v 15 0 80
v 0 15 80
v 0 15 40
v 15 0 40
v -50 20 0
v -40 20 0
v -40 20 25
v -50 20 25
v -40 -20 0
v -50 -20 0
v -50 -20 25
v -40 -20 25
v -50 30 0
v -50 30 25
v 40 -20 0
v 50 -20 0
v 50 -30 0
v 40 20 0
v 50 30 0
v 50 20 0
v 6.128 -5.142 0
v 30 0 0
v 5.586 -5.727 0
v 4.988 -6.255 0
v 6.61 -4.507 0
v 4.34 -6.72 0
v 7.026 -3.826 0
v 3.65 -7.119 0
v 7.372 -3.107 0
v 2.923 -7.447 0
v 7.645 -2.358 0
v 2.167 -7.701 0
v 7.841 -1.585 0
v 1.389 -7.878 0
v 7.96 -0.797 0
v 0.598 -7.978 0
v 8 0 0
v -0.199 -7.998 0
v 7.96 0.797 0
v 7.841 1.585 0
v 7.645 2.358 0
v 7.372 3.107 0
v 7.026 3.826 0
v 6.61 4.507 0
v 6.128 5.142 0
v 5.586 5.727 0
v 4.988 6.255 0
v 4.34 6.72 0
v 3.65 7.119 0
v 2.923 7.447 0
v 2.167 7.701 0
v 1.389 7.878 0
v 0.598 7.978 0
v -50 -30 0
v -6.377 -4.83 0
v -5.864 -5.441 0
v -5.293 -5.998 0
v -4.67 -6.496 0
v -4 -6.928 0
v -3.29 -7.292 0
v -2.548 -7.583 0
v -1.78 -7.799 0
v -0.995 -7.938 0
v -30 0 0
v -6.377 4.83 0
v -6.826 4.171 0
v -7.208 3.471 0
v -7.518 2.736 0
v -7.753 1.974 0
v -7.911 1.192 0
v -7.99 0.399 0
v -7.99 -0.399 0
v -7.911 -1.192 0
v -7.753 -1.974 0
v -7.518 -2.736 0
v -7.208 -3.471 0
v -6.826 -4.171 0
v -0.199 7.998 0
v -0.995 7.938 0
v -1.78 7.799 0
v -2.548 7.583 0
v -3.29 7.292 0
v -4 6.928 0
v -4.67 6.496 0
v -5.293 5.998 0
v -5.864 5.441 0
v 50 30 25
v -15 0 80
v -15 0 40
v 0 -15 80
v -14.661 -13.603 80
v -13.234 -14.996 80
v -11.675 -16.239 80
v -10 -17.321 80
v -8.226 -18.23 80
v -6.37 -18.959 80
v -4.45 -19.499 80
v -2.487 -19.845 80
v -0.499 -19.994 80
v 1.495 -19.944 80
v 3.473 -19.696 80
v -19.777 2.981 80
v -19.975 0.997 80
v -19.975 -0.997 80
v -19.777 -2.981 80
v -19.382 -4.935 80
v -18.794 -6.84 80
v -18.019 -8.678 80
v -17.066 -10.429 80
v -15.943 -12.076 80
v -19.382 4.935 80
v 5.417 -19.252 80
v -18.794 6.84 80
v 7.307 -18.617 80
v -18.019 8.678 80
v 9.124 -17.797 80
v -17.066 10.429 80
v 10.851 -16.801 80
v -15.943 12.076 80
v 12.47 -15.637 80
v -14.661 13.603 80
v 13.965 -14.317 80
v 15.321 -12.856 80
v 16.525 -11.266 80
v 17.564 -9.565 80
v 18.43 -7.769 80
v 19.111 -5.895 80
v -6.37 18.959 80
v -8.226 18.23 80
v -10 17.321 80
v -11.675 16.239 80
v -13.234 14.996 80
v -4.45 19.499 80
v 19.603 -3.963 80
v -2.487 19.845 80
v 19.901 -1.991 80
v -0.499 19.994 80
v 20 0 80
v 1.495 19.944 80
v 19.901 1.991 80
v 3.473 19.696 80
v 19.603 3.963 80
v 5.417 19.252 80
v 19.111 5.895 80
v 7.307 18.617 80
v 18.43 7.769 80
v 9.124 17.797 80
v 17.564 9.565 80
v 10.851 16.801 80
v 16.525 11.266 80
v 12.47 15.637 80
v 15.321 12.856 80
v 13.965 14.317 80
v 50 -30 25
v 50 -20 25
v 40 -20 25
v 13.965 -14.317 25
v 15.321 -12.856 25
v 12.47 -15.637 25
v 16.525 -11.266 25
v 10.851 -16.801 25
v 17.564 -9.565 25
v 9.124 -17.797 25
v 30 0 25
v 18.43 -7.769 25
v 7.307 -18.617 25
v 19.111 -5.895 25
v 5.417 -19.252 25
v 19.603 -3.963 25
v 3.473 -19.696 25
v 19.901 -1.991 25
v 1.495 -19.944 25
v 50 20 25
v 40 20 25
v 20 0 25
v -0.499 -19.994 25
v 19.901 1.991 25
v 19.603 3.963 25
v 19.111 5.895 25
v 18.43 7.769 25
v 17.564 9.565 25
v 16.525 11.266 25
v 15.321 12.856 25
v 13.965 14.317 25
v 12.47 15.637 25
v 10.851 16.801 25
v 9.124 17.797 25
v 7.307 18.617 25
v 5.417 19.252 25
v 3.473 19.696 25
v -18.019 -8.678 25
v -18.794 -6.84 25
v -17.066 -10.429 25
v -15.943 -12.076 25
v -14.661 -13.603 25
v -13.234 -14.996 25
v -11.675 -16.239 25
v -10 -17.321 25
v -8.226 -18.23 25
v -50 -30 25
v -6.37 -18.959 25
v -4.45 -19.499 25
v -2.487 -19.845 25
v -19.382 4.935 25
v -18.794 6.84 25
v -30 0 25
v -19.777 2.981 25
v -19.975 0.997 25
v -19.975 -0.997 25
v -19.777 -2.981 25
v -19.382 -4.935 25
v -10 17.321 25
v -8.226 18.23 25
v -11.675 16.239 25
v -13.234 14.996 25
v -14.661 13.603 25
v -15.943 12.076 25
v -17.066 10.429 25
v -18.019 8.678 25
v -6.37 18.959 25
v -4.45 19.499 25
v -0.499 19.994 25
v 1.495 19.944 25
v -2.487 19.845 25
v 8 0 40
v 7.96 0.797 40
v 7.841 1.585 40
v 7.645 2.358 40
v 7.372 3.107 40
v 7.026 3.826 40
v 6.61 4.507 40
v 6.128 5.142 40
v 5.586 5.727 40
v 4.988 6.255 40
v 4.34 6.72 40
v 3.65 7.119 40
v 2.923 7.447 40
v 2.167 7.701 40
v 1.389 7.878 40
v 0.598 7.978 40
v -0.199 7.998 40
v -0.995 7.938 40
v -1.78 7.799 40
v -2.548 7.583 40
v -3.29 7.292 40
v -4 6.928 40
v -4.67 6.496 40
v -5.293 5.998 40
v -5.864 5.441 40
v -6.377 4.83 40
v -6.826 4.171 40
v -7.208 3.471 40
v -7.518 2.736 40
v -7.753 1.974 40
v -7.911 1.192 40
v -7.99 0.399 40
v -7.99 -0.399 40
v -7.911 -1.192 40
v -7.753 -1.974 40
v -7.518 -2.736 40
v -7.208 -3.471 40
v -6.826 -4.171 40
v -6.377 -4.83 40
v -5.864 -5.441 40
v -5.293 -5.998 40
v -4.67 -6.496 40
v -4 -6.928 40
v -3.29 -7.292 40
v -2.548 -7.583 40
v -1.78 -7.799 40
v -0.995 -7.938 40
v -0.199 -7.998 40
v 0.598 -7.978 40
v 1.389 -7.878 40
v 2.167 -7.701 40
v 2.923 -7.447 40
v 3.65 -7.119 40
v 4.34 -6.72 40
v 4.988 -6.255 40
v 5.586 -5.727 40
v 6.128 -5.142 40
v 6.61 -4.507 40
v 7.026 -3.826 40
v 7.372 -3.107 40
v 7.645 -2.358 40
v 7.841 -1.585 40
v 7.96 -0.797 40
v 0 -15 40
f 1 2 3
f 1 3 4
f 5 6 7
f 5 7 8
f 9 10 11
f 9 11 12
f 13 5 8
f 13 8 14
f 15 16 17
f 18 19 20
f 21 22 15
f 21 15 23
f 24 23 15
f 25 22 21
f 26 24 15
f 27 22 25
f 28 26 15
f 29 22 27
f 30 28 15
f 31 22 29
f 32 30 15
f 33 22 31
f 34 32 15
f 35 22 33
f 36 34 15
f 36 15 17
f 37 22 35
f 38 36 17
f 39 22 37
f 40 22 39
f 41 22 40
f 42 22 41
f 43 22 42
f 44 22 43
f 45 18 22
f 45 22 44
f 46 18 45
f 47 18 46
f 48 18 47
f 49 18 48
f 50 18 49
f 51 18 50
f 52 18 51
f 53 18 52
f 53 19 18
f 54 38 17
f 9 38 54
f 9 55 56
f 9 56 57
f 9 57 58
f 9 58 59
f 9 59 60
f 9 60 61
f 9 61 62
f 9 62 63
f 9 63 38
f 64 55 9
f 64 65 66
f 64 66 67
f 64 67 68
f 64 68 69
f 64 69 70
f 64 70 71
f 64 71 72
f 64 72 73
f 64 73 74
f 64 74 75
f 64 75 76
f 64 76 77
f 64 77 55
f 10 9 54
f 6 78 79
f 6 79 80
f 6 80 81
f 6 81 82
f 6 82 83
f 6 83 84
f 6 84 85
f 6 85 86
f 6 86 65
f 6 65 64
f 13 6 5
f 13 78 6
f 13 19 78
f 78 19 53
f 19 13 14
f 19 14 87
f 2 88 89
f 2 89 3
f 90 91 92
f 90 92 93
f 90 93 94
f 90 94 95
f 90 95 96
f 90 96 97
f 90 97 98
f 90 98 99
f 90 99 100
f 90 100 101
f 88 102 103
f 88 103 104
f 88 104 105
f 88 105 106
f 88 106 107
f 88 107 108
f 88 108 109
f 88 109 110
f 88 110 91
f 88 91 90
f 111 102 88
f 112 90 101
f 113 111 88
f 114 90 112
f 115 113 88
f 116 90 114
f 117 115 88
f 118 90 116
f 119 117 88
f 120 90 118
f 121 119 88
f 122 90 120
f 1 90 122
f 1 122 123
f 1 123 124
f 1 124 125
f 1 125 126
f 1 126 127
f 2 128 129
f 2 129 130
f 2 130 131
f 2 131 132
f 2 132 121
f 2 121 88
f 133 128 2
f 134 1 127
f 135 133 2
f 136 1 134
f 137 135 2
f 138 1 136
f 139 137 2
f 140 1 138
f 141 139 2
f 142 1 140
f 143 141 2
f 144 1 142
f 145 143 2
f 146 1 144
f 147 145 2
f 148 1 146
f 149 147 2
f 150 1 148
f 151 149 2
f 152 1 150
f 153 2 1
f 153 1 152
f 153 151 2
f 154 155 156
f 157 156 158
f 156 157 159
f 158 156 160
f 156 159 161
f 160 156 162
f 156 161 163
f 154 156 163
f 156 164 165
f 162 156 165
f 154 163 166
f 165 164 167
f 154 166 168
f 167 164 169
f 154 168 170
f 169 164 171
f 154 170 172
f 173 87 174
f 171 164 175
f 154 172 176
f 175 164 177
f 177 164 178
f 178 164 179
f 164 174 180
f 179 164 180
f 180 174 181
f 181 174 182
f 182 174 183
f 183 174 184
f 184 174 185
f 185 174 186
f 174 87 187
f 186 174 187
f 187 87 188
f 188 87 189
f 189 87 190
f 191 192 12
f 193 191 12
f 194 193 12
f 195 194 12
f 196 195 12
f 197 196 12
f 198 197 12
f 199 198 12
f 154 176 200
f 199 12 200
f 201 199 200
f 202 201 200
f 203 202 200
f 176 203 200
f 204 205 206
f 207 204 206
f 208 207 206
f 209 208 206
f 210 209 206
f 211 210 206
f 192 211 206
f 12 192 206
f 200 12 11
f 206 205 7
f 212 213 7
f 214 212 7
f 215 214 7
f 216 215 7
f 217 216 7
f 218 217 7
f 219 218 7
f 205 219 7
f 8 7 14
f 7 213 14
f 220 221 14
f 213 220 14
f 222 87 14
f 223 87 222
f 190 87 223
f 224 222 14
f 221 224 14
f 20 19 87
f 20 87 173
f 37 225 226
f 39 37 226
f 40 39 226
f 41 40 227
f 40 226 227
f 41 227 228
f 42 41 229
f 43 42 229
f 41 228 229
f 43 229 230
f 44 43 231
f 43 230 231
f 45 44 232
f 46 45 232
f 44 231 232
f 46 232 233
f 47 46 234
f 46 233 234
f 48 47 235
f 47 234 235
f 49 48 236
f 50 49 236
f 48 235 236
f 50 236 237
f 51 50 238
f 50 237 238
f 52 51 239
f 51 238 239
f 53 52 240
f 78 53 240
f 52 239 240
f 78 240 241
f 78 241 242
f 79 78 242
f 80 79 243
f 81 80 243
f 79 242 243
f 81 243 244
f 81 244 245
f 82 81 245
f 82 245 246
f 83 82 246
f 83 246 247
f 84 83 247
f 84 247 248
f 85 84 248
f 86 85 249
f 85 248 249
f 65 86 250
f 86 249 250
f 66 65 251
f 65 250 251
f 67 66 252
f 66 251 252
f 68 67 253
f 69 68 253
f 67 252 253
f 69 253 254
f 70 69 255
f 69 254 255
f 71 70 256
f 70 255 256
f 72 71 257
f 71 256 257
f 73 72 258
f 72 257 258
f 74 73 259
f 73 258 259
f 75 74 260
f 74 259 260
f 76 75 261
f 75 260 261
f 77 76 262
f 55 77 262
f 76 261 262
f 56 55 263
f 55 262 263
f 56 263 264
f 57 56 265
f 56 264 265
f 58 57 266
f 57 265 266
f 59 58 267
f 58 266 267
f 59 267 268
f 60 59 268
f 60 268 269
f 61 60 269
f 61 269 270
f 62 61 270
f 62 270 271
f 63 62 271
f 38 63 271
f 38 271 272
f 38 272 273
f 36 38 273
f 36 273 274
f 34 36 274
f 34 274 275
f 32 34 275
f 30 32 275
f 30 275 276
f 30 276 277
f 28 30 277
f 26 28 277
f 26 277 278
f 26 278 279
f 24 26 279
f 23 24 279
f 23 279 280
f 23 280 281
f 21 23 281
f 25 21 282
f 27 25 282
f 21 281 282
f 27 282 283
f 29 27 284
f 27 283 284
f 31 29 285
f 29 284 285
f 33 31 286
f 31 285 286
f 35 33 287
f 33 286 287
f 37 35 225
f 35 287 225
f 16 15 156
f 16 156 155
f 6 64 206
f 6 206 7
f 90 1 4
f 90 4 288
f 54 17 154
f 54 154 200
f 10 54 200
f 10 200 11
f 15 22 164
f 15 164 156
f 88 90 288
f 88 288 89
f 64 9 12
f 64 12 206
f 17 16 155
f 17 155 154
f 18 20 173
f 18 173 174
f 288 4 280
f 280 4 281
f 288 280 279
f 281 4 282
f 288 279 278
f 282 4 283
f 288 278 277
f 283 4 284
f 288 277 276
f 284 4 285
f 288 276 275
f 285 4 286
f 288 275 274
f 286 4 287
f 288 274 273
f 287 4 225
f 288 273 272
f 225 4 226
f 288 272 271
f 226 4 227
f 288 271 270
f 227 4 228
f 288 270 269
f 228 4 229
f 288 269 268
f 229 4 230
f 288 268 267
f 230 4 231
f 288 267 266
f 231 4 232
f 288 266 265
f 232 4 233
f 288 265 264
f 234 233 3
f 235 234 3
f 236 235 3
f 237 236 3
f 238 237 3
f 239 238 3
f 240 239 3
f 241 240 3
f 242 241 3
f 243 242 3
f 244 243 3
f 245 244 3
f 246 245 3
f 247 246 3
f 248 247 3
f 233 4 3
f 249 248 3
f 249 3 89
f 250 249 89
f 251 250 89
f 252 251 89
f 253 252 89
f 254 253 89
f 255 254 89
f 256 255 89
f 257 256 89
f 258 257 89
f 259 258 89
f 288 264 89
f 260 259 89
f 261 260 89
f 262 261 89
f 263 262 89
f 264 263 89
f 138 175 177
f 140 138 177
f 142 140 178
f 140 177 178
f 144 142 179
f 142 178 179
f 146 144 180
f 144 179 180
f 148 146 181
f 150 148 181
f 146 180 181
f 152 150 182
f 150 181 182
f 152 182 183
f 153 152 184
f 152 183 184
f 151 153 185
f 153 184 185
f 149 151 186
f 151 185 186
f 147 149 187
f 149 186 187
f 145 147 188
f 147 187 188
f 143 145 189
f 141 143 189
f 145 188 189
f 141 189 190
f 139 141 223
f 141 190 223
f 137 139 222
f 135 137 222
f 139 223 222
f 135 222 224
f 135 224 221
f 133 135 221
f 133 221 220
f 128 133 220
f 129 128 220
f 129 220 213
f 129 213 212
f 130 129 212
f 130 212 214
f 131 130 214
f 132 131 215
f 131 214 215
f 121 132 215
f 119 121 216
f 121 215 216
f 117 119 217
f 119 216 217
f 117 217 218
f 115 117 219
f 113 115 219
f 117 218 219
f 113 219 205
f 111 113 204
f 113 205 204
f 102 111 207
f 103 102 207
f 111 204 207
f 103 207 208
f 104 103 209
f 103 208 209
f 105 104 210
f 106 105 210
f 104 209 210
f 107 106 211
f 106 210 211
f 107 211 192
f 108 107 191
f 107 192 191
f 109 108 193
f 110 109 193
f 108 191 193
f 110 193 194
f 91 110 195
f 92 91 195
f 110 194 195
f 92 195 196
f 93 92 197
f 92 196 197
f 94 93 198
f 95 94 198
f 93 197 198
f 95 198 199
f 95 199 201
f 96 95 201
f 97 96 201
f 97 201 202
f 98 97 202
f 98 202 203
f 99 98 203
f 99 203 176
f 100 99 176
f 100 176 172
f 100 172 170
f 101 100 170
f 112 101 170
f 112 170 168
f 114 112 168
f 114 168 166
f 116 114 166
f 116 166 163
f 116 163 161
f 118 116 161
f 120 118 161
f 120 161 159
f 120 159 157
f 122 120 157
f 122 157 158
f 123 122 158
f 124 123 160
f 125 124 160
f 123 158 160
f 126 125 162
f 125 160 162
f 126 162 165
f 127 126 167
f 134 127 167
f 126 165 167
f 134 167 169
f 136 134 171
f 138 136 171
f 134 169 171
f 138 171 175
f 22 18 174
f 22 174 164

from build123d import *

# Parameters (mm, degrees)
EXTRUDE_1_DEPTH     = 25
SKETCH_2_R          = 20
EXTRUDE_2_DEPTH     = 55
CUT_EXTRUDE_1_DEPTH = 40
SKETCH_4_R          = 8
CUT_EXTRUDE_2_DEPTH = 40


with BuildPart() as part:
    # Эскиз1 → Бобышка-Вытянуть1 (new body)
    with BuildSketch(Plane.XY):
        Polygon((50, -30), (-50, -30), (-50, -20), (-40, -20), (-30, 0), (-40, 20), (-50, 20), (-50, 30), (50, 30), (50, 20), (40, 20), (30, 0), (40, -20), (50, -20), align=None)
    extrude(amount=EXTRUDE_1_DEPTH)

    # Эскиз2 → Бобышка-Вытянуть2 (add)
    with BuildSketch(Plane.XY.offset(25)):
        Circle(SKETCH_2_R)
    extrude(amount=EXTRUDE_2_DEPTH)

    # Эскиз3 → Вырез-Вытянуть1 (cut)
    with BuildSketch(Plane.XY.offset(80)):
        Polygon((15, 0), (0, -15), (-15, 0), (0, 15), align=None)
    extrude(amount=-CUT_EXTRUDE_1_DEPTH, mode=Mode.SUBTRACT)

    # Эскиз4 → Вырез-Вытянуть2 (cut)
    with BuildSketch(Plane.XY.offset(40)):
        Circle(SKETCH_4_R)
    extrude(amount=-CUT_EXTRUDE_2_DEPTH, mode=Mode.SUBTRACT)


solid = part.part
